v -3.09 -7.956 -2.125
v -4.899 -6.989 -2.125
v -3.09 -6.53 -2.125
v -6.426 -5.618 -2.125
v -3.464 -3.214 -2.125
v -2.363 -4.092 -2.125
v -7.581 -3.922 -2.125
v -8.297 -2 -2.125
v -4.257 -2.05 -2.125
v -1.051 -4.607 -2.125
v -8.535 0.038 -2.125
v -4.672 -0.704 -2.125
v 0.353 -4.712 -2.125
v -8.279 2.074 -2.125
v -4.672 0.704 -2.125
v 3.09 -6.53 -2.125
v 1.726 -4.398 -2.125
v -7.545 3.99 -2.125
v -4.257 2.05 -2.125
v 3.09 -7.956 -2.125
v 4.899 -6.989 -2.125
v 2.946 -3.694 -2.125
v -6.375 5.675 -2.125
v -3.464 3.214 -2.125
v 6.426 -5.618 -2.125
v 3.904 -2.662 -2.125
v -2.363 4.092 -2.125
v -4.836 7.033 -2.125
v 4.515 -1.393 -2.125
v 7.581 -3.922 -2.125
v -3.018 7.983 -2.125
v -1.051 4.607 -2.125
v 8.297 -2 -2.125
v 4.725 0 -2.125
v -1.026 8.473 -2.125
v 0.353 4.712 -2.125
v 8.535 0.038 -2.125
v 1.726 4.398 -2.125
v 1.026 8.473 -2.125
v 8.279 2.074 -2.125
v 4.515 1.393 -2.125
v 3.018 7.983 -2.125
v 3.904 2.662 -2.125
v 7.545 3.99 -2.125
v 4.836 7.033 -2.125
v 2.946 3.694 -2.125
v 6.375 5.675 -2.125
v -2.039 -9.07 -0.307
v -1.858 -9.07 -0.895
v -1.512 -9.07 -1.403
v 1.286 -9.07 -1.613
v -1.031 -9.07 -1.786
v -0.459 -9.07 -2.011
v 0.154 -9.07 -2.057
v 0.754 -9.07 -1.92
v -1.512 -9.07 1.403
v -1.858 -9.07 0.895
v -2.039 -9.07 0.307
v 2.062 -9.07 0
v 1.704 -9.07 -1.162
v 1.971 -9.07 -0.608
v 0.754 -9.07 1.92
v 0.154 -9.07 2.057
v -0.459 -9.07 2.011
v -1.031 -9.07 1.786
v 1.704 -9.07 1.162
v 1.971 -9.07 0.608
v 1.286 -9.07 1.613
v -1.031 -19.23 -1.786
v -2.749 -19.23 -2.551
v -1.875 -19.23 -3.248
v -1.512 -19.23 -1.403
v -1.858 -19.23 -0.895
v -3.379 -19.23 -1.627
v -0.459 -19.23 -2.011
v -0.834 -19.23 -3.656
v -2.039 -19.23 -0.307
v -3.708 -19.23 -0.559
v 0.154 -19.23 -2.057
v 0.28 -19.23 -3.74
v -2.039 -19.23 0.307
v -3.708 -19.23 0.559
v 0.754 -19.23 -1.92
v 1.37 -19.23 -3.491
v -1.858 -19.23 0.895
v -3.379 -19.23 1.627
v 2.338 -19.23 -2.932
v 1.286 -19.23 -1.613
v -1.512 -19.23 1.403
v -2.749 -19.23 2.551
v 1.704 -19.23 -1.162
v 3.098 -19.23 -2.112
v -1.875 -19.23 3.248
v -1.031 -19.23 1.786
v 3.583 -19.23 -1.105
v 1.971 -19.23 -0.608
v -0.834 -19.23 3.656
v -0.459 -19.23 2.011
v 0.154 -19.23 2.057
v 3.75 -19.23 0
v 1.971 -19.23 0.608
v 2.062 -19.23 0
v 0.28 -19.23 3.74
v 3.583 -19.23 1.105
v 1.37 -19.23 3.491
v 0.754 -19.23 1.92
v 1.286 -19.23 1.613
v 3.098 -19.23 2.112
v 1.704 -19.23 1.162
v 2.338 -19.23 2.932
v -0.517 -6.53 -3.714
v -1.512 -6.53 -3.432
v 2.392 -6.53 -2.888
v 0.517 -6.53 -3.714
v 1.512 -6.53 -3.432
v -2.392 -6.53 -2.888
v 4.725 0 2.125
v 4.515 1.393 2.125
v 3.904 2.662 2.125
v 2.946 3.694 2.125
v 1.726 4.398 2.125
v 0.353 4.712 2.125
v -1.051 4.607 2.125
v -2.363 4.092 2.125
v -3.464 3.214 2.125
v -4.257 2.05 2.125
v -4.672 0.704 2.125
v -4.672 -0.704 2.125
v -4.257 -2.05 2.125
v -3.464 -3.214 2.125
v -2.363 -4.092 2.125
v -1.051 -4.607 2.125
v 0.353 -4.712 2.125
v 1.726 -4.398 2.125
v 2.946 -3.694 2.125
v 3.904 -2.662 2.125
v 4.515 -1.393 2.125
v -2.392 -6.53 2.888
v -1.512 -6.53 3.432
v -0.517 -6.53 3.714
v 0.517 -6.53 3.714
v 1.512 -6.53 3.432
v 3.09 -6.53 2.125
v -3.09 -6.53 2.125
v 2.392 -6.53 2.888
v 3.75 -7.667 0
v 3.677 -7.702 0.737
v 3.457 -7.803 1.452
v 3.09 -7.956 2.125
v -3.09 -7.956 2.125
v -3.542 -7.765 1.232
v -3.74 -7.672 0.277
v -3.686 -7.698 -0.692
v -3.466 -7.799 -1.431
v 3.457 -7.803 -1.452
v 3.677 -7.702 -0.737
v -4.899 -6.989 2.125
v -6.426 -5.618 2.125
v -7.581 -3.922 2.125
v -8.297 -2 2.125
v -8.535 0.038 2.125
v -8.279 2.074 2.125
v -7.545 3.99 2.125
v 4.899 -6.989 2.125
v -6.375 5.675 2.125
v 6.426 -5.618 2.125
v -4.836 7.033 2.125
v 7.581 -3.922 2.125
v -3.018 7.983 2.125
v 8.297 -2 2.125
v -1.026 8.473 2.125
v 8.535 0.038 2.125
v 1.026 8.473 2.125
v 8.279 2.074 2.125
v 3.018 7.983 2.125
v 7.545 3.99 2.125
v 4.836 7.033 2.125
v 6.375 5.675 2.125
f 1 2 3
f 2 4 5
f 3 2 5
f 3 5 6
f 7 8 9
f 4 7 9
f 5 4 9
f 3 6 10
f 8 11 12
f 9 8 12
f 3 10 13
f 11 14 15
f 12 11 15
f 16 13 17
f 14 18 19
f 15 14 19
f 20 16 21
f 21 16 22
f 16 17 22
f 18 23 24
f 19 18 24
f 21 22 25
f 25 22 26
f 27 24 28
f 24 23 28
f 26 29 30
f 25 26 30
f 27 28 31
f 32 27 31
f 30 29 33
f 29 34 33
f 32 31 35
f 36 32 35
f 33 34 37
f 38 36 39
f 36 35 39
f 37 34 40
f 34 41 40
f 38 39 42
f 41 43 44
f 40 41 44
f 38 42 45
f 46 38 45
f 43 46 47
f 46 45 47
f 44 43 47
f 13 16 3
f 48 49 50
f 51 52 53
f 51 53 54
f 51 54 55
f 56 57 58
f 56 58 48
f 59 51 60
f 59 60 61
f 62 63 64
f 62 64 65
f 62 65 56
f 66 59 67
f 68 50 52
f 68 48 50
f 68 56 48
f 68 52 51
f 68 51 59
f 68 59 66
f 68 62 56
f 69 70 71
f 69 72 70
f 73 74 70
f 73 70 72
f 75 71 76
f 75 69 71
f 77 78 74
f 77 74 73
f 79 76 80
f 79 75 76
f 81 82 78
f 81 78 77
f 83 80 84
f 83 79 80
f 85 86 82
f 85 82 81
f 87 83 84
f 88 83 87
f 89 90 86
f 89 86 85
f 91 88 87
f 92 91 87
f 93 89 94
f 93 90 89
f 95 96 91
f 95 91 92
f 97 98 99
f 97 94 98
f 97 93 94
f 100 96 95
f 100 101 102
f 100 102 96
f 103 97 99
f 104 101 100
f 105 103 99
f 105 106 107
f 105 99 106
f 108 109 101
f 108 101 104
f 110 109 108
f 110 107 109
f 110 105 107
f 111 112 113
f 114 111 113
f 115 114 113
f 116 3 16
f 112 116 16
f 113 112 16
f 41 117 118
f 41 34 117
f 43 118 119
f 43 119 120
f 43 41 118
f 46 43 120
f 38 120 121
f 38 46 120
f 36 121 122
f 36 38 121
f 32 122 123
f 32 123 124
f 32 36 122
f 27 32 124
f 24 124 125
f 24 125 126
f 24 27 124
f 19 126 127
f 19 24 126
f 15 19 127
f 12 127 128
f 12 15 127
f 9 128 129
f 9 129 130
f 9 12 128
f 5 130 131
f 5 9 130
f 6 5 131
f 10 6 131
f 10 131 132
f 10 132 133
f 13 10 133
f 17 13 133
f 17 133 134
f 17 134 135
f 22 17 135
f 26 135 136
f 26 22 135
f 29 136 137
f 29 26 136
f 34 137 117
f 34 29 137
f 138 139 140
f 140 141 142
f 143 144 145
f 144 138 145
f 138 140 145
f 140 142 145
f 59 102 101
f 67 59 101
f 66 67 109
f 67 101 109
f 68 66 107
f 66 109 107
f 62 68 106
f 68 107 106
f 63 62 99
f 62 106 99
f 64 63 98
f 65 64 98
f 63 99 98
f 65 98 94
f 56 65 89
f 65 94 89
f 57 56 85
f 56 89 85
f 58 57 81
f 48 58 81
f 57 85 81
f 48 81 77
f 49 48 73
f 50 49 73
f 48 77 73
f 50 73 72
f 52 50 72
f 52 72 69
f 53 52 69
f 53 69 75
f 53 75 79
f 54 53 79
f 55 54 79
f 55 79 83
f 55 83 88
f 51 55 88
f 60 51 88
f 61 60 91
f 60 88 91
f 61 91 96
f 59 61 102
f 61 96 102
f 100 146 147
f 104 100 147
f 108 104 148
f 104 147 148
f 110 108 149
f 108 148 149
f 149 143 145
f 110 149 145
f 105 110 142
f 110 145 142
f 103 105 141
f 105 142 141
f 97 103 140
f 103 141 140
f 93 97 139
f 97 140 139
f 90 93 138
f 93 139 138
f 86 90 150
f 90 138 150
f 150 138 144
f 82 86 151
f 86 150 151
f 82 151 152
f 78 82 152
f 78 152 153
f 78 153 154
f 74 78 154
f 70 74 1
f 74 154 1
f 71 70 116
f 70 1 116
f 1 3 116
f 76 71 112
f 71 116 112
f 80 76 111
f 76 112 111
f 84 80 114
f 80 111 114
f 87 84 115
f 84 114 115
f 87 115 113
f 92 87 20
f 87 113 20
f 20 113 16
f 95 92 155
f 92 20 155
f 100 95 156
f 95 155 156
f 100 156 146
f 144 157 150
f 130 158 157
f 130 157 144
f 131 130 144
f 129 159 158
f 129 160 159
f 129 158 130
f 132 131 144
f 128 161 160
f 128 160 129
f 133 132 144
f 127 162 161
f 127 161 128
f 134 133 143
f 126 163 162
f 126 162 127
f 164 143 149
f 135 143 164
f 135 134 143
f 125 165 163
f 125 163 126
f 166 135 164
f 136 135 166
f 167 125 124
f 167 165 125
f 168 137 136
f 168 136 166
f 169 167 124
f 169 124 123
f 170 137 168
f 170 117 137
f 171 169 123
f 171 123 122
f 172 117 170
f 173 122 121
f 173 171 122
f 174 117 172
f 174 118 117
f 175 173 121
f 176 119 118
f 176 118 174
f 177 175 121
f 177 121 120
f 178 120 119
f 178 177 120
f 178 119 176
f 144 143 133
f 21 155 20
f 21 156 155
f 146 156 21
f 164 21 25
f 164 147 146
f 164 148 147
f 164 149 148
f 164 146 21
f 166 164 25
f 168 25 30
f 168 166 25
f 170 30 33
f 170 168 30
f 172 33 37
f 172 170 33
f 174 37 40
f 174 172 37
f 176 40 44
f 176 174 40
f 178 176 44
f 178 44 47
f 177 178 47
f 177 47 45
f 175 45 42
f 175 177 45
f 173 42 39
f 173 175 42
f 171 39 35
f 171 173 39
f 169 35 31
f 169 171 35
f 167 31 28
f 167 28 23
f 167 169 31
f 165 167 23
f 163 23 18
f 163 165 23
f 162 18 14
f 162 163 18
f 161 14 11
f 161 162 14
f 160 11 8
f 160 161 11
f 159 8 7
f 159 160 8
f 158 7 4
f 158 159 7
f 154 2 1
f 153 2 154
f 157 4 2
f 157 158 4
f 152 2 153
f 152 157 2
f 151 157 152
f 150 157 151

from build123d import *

# Parameters (mm, degrees)
F0_R     = 8.535
F0_R_2   = 4.725
F1_DEPTH = 2.125
F3_R     = 3.75
F3_R_2   = 2
F4_DEPTH = 12.7
F5_R     = 2.0625
F6_DEPTH = 10.16


with BuildPart() as f1:
    # F0 (on Top) → F1 (new body, symmetric)
    with BuildSketch(Plane.XY):
        Circle(F0_R)
        Circle(F0_R_2, mode=Mode.SUBTRACT)
    extrude(amount=F1_DEPTH, both=True)

    # F3 (on offset) → F4 (join)
    with BuildSketch(Plane.XZ.offset(6.53)):
        Circle(F3_R)
        Circle(F3_R_2, mode=Mode.SUBTRACT)
        Circle(F3_R_2)
    extrude(amount=F4_DEPTH)

    # F5 (on face) → F6 (cut)
    with BuildSketch(Plane.XZ.offset(19.23)):
        Circle(F5_R)
    extrude(amount=-F6_DEPTH, mode=Mode.SUBTRACT)


solid = f1.part
